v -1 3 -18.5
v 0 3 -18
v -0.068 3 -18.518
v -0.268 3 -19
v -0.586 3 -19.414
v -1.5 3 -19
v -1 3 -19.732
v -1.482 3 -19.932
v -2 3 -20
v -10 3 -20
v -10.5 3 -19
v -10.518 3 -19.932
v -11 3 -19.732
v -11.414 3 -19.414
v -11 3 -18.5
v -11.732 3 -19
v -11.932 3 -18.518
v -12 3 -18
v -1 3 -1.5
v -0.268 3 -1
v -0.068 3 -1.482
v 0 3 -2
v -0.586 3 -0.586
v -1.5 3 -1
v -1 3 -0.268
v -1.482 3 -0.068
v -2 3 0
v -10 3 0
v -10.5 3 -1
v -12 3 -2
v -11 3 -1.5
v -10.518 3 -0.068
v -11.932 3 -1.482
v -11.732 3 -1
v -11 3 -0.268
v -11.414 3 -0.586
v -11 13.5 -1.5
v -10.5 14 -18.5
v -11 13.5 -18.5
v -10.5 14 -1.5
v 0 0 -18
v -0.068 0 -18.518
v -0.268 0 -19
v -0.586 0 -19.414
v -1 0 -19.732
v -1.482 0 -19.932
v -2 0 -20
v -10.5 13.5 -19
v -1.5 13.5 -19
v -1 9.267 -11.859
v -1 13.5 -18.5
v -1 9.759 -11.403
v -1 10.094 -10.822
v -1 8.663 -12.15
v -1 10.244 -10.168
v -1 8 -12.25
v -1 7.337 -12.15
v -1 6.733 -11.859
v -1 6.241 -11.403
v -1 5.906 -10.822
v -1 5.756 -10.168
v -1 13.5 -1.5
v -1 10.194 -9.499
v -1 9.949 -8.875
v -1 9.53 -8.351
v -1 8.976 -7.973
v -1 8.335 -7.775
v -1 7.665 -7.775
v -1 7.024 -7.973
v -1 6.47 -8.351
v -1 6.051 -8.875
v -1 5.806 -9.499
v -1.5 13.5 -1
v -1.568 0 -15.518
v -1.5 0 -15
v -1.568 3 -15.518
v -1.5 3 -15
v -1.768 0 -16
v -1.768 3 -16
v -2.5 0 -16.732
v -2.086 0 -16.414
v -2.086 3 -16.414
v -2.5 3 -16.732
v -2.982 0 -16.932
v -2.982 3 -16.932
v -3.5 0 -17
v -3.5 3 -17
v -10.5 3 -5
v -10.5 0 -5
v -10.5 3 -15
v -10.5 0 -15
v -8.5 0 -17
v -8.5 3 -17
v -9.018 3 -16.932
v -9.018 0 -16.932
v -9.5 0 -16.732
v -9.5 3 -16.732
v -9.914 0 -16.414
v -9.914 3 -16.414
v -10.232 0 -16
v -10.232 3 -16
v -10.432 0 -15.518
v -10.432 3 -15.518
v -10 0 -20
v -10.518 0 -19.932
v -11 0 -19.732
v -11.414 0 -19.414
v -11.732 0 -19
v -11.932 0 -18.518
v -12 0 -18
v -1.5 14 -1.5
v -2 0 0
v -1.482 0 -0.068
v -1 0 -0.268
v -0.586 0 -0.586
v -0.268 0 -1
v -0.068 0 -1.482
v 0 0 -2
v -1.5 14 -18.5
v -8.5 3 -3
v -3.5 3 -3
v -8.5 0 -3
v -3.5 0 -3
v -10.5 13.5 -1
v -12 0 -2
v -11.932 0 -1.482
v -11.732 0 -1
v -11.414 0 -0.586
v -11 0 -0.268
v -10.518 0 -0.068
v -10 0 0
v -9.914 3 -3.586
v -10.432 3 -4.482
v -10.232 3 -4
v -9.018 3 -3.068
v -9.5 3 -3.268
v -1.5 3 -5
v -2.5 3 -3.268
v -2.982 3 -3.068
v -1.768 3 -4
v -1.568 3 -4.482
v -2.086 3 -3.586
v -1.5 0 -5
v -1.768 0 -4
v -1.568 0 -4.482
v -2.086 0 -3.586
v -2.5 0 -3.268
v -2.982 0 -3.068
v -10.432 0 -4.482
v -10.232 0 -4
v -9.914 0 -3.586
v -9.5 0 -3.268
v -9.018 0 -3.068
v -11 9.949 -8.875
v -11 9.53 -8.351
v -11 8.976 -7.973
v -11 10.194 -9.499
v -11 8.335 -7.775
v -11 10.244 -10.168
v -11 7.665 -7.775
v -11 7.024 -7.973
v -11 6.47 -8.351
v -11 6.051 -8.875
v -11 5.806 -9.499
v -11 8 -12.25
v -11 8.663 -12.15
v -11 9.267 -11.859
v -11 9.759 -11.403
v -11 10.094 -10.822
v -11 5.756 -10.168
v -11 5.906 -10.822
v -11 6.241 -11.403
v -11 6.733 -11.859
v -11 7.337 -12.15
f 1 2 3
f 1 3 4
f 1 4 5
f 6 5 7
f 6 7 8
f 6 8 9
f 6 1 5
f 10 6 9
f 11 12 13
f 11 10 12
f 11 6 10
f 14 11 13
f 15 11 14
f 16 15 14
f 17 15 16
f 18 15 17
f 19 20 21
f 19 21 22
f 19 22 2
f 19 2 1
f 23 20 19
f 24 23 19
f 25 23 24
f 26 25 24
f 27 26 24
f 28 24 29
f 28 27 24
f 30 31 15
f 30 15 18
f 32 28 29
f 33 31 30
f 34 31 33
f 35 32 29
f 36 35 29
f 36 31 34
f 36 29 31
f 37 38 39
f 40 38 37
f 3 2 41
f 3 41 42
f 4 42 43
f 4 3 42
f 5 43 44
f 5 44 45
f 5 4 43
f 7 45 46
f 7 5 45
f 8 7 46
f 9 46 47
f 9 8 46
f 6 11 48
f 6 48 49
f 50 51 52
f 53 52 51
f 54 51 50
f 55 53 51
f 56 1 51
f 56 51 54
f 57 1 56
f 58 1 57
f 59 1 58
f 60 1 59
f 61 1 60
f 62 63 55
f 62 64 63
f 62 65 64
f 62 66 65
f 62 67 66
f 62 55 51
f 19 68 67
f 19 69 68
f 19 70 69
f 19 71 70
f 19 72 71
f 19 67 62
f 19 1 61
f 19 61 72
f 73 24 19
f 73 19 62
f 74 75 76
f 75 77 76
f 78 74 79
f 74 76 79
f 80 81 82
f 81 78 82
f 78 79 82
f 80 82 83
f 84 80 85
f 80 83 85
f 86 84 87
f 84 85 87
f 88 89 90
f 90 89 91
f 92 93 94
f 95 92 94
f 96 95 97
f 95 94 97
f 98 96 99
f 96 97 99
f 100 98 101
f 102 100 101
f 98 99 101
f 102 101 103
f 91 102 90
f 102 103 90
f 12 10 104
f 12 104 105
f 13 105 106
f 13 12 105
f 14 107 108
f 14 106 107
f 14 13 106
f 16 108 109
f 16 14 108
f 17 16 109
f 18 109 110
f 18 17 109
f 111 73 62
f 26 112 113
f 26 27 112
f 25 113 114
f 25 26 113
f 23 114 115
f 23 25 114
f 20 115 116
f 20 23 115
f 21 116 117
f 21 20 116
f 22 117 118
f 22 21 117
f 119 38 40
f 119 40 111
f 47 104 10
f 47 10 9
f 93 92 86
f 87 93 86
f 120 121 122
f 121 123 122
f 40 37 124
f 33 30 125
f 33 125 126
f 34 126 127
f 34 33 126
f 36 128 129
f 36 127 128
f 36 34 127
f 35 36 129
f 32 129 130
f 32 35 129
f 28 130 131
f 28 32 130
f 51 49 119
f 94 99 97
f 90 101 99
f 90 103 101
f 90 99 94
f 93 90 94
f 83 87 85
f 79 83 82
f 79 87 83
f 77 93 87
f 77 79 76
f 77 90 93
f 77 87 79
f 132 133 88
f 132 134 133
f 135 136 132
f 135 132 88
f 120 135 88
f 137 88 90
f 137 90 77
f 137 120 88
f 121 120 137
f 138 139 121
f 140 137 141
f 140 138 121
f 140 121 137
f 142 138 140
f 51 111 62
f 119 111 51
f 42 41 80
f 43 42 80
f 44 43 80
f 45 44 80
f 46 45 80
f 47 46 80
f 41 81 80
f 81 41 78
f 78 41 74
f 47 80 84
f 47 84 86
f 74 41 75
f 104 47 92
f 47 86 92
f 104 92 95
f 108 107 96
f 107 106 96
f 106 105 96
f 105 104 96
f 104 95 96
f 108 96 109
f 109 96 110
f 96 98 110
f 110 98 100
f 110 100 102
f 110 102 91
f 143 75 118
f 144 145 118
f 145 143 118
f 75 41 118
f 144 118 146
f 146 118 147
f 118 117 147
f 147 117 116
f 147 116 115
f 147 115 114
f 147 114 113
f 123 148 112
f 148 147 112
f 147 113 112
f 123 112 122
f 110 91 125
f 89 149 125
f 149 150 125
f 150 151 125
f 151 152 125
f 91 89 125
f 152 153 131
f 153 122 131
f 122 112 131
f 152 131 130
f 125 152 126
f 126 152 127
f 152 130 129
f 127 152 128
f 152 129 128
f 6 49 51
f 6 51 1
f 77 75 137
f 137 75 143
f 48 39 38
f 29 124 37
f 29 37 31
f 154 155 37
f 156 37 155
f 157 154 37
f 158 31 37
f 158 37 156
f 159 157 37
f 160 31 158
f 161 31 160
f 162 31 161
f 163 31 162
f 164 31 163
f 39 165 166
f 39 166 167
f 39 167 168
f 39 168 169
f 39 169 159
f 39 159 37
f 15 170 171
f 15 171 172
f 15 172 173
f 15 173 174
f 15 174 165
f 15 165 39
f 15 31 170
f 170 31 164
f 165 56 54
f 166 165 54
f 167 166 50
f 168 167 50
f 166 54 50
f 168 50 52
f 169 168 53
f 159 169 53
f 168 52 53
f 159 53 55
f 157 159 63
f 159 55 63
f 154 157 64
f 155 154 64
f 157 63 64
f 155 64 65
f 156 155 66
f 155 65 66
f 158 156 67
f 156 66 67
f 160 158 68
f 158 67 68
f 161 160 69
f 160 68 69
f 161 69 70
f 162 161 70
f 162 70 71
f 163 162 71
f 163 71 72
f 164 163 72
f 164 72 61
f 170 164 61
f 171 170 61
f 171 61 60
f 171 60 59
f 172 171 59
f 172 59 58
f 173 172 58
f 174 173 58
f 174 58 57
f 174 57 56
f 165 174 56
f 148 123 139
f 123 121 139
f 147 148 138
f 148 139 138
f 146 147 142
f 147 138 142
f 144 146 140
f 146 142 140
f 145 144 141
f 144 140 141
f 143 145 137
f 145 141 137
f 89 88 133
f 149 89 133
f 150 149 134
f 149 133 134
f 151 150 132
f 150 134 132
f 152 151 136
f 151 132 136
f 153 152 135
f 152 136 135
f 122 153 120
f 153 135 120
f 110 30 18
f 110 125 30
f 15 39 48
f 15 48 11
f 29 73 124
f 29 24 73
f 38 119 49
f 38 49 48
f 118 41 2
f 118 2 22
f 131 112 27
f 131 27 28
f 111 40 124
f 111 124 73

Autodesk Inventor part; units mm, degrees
ref_plane "YZ Plane" through (0, 0, 0) normal (1, 0, 0) x (0, 1, 0)
ref_plane "XZ Plane" through (0, 0, 0) normal (0, 1, 0) x (-1, 0, 0)
ref_plane "XY Plane" through (0, 0, 0) normal (0, 0, 1) x (1, 0, 0)
sketch "Sketch1" plane through (0, 0, 0) normal (0, 1, 0) x (-1, 0, 0)
  line L0 (0, 0) -> (12, 0)
  line L1 (12, 0) -> (12, -20)
  line L2 (12, -20) -> (0, -20)
  line L3 (0, -20) -> (0, 0)
  dimension "d0" = 12
  dimension "d1" = 20
extrude "Extrusion1" add sketch "Sketch1" along normal blind 3
sketch "Sketch2" plane through (0, 3, 0) normal (0, 1, 0) x (1, 0, 0)
  line L0 (-12, 20) -> (-12, 0) construction
  line L1 (-12, 10) -> (0, 10) construction
  line L2 (0, 0) -> (0, 20) construction
  line L3 (-1, 1) -> (-11, 1) construction
  line L4 (-11, 1) -> (-11, 19) construction
  line L5 (-11, 19) -> (-1, 19) construction
  line L6 (-1, 19) -> (-1, 1) construction
  line L7 (-1, 1) -> (-11, 19) construction
  line L8 (-11, 1) -> (-1, 19) construction
  line L9 (-1, 1) -> (-11, 1)
  line L10 (-11, 1) -> (-11, 19)
  line L11 (-11, 19) -> (-1, 19)
  line L12 (-1, 19) -> (-1, 1)
  line L13 (-1, 1) -> (-11, 19) construction
  line L14 (-11, 1) -> (-1, 19) construction
  point P0 (-6, 10)
  point P1 (-6, 10)
  dimension "d4" = 10
  dimension "d5" = 18
extrude "Extrusion2" add sketch "Sketch2" along normal blind 11
sketch "Sketch3" plane through (-1, 3, -1) normal (1, 0, 0) x (0, 0, -1)
  line L0 (19, -3) -> (-1, -3) construction
  line L1 (9, -3) -> (9, 5) construction
  circle A0 centre (9, 5) radius 2.25
  dimension "d8" = 8
  dimension "d9" = 4.5
extrude "Extrusion3" cut sketch "Sketch3" against normal blind 10
sketch "Sketch4" plane through (0, 0, 0) normal (0, -1, 0) x (1, 0, 0)
  line L0 (0, 0) -> (0, -20) construction
  line L1 (0, -10) -> (-12, -10) construction
  line L2 (-12, -20) -> (-12, 0) construction
  line L3 (-10.5, -3) -> (-1.5, -3) construction
  line L4 (-1.5, -3) -> (-1.5, -17) construction
  line L5 (-1.5, -17) -> (-10.5, -17) construction
  line L6 (-10.5, -17) -> (-10.5, -3) construction
  line L7 (-10.5, -3) -> (-1.5, -17) construction
  line L8 (-1.5, -3) -> (-10.5, -17) construction
  line L9 (-1.5, -3) -> (-10.5, -3) construction
  line L10 (-10.5, -3) -> (-10.5, -17) construction
  line L11 (-10.5, -17) -> (-1.5, -17) construction
  line L12 (-1.5, -17) -> (-1.5, -3) construction
  line L13 (-1.5, -3) -> (-10.5, -3)
  line L14 (-10.5, -3) -> (-10.5, -17)
  line L15 (-10.5, -17) -> (-1.5, -17)
  line L16 (-1.5, -17) -> (-1.5, -3)
  point P0 (-6, -10)
  dimension "d12" = 9
  dimension "d13" = 14
extrude "Extrusion4" cut sketch "Sketch4" against normal blind 3
fillet "Fillet1" radius 2 8 edges at (-1.5, 1.5, -3) (-1.5, 1.5, -17) (-10.5, 1.5, -3) (-10.5, 1.5, -17) (0, 1.5, 0) (0, 1.5, -20) (-12, 1.5, 0) (-12, 1.5, -20)
chamfer "Chamfer1" distance 0.5 angle 45 8 edges at (-1, 8.5, -1) (-11, 14, -10) (-1, 8.5, -19) (-11, 8.5, -19) (-11, 8.5, -1) (-6, 14, -1) (-6, 14, -19) (-1, 14, -10)
properties part number "Steam Chest Slide Valve" material "Brass, Soft Yellow"
